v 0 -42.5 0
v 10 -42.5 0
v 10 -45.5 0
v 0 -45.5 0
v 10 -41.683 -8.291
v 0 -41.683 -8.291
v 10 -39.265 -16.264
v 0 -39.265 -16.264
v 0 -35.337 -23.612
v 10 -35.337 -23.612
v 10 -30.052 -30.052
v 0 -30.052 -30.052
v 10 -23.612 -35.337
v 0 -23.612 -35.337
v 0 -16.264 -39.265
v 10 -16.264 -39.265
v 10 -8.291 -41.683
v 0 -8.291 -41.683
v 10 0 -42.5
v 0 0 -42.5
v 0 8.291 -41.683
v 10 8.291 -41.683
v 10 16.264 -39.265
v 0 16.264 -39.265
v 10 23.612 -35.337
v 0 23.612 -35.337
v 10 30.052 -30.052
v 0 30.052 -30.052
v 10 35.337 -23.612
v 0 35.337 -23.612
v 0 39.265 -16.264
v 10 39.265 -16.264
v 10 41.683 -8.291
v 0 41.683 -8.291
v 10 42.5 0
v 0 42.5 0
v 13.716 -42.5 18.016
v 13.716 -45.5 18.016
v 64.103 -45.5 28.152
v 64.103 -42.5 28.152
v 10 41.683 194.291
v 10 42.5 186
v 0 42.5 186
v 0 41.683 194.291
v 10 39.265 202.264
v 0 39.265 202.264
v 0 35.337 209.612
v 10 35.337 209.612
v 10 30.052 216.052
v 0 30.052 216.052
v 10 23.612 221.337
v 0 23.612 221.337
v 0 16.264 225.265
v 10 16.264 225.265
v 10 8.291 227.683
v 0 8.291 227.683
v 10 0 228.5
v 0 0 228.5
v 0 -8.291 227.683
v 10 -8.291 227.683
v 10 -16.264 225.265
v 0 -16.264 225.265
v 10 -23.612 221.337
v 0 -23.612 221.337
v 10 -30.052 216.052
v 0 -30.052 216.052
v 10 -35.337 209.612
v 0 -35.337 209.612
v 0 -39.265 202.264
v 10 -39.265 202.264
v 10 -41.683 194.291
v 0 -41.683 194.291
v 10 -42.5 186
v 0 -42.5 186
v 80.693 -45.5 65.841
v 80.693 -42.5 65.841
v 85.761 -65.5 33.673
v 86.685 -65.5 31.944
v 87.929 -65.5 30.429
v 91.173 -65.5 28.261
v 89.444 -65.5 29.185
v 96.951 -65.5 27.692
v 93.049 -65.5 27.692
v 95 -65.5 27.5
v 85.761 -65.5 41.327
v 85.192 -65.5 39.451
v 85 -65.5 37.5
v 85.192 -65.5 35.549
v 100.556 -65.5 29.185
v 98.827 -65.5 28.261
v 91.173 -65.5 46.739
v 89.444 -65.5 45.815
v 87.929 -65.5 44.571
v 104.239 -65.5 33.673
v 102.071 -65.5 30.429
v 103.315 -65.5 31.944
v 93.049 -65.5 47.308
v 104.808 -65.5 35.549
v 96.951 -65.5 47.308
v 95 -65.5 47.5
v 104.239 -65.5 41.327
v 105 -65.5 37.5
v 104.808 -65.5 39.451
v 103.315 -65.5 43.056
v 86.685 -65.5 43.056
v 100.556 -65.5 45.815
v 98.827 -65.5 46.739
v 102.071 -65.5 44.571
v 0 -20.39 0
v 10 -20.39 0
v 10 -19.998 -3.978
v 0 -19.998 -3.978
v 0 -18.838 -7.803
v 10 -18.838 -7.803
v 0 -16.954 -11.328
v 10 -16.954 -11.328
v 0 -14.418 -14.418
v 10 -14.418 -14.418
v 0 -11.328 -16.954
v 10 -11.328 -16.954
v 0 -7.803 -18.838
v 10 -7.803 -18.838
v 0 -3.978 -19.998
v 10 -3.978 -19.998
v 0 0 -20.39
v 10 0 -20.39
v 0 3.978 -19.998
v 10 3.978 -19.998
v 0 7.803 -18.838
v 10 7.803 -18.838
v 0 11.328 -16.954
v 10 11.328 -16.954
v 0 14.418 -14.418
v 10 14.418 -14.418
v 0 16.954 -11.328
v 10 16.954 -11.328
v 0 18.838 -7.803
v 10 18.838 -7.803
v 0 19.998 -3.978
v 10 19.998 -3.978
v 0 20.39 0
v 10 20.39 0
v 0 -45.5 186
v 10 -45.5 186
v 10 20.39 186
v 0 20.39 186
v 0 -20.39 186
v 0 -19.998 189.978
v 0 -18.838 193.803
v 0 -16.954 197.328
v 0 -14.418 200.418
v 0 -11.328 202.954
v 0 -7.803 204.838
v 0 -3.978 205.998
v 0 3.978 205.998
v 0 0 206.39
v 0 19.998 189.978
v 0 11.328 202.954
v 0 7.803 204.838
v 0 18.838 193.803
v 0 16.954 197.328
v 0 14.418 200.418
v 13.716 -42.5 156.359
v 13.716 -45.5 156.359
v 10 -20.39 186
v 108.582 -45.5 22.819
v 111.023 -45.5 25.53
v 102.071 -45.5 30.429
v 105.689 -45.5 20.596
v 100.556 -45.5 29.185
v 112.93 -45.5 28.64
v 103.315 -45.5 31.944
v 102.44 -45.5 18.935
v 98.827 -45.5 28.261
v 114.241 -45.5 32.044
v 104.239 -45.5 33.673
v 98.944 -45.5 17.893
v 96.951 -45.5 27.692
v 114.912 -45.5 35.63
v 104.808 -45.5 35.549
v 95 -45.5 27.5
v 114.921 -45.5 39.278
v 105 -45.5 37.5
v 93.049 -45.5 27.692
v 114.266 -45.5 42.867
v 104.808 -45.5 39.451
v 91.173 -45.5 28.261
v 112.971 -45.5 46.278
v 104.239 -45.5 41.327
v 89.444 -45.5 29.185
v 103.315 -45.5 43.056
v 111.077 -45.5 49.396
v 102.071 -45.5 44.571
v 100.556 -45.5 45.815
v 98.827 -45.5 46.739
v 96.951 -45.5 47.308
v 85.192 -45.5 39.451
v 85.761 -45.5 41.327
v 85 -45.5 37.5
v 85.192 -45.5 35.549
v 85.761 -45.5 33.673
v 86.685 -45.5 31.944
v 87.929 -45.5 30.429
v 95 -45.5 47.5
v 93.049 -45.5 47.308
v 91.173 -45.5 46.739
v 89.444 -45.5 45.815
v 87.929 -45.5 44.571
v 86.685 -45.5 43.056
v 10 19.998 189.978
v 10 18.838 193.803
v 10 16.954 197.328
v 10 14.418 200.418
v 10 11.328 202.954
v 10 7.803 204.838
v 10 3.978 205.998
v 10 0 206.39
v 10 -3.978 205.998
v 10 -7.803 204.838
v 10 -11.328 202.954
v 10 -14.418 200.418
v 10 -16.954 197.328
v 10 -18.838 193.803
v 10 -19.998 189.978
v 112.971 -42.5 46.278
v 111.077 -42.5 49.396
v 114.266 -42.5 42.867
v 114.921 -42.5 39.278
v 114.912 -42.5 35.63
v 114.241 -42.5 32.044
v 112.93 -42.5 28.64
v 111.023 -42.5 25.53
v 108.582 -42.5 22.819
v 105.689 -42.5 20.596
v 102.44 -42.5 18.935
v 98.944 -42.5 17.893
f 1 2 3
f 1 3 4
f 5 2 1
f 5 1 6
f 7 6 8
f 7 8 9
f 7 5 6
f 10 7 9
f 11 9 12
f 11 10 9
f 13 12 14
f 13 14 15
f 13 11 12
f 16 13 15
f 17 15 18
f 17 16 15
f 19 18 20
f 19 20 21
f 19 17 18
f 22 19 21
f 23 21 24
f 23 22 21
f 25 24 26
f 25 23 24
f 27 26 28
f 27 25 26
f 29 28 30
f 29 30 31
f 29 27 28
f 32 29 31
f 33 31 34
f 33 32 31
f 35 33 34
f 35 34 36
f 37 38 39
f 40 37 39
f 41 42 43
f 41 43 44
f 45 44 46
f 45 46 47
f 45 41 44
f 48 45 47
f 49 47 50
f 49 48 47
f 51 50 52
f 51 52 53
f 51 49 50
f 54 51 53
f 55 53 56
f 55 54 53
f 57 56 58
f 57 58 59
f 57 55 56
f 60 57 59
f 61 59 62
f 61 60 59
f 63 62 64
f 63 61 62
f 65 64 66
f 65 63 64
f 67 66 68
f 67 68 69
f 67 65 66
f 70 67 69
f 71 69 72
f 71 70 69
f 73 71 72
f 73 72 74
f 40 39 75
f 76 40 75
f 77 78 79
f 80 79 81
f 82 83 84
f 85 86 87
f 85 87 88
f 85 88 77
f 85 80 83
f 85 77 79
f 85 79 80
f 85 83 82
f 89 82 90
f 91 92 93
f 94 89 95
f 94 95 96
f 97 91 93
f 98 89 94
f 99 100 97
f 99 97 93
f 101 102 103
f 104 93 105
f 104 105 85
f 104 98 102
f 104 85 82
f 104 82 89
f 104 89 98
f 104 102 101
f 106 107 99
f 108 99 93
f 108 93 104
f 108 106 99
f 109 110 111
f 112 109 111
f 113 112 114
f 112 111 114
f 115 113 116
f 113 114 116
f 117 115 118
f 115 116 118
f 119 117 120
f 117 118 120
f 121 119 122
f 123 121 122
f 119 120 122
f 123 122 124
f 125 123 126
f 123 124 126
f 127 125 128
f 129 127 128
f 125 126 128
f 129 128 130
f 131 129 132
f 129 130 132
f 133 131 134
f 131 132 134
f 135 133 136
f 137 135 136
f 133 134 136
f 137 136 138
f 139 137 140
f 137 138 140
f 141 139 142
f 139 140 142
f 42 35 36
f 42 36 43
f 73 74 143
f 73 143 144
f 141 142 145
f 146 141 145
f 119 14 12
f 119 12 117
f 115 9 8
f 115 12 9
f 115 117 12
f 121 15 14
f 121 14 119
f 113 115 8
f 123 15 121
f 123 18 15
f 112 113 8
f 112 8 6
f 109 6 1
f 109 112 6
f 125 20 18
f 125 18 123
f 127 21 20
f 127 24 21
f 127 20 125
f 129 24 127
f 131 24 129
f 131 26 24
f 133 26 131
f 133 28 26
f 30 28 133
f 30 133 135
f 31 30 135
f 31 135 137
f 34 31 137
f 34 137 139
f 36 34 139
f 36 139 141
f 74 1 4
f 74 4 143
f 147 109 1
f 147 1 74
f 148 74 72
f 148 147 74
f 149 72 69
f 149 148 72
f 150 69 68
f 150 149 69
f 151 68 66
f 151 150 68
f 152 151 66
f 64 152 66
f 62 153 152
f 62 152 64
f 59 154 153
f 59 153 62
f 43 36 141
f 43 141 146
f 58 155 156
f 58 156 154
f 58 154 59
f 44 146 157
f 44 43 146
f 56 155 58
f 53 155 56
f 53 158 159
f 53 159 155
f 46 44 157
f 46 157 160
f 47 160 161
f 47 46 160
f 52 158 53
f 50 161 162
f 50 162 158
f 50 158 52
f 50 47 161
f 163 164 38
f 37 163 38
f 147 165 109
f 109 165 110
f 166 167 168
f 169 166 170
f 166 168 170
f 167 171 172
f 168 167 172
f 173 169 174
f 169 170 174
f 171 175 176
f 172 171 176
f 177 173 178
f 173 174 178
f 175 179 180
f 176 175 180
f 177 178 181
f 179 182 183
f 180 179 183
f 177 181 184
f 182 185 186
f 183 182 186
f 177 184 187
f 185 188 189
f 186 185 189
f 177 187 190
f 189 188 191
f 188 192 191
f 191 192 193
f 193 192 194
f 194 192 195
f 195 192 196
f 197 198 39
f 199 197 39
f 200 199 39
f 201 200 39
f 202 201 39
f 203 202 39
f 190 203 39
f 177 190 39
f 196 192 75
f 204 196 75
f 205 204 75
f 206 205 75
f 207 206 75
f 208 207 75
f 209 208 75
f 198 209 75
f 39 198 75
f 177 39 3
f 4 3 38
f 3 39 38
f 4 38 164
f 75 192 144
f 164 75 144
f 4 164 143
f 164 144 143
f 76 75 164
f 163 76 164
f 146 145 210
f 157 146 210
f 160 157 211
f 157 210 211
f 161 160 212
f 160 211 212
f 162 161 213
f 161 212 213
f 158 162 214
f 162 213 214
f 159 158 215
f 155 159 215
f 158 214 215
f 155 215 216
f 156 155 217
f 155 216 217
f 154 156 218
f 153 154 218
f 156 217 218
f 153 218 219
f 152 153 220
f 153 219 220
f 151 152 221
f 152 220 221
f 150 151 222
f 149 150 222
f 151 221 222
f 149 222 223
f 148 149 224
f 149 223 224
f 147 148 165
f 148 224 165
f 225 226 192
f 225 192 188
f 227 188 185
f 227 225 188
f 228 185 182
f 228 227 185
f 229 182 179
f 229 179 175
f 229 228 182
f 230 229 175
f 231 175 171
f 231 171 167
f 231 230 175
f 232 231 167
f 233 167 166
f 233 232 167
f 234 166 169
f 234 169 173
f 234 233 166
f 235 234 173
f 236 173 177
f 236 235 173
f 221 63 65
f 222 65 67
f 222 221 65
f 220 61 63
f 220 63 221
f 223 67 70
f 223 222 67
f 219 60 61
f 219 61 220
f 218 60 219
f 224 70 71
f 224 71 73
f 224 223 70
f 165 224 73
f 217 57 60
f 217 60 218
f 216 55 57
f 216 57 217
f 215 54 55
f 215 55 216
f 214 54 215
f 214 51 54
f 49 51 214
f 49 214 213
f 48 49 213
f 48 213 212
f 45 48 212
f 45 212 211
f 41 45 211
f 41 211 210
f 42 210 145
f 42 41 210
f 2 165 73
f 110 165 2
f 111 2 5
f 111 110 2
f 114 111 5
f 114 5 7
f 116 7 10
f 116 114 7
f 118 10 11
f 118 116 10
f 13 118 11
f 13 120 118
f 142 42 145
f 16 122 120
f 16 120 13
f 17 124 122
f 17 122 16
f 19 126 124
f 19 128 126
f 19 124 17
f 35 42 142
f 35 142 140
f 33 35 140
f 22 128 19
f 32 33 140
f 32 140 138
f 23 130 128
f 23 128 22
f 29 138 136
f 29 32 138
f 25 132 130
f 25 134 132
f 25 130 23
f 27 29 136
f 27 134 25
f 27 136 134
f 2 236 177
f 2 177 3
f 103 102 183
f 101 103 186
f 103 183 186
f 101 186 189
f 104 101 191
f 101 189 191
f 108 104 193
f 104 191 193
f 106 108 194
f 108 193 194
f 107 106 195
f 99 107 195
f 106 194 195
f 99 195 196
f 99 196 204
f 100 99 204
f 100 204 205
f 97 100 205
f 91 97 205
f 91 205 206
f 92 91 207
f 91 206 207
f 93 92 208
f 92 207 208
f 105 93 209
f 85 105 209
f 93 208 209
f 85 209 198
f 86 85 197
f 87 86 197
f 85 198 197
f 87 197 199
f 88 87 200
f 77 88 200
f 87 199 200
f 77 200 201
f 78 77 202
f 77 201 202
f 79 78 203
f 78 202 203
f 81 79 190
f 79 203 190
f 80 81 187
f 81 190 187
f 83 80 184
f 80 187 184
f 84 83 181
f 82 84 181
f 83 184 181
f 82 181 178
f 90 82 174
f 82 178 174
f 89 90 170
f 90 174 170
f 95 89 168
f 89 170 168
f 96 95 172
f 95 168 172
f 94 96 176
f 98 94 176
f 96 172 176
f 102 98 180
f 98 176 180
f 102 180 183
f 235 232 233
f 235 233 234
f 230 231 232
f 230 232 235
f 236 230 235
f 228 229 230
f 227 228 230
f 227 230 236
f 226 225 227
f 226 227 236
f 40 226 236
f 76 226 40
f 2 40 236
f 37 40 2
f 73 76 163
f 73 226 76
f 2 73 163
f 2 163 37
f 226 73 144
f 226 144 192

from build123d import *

# Parameters (mm, degrees)
BOSS_EXTRUDE1_DEPTH = 10
BOSS_EXTRUDE2_DEPTH = 3
SKETCH3_R           = 10
BOSS_EXTRUDE3_DEPTH = 20
CUT_EXTRUDE1_DEPTH  = 11
CUT_EXTRUDE2_DEPTH  = 89


with BuildPart() as part:
    # Sketch1 → Boss-Extrude1 (new body)
    with BuildSketch(Plane(origin=(10, 0, 0), x_dir=(0, 0, -1), z_dir=(1, 0, 0))):
        with BuildLine():
            Line((0, 42.5), (-186, 42.5))
            ThreePointArc((-186, 42.5), (-228.5, 0), (-186, -42.5))
            Line((-186, -42.5), (0, -42.5))
            ThreePointArc((0, -42.5), (42.5, 0), (0, 42.5))
        make_face()
    extrude(amount=-BOSS_EXTRUDE1_DEPTH)

    # Sketch2 → Boss-Extrude2 (add)
    with BuildSketch(Plane.XZ.offset(42.5)):
        with BuildLine():
            Line((98.944350751, 17.892804965), (10, 0))
            Line((10, 0), (0, 0))
            Line((0, 0), (0, 186))
            Line((0, 186), (10, 186))
            Line((10, 186), (111.07737178, 49.396138729))
            ThreePointArc((111.07737178, 49.396138729), (113.663663971, 30.311978912), (98.944350751, 17.892804965))
        make_face()
    extrude(amount=BOSS_EXTRUDE2_DEPTH)

    # Sketch3 → Boss-Extrude3 (add)
    with BuildSketch(Plane.XZ.offset(45.5)):
        with Locations((95, 37.5)):
            Circle(SKETCH3_R)
    extrude(amount=BOSS_EXTRUDE3_DEPTH)

    # Sketch4 → Cut-Extrude1 (cut, through all)
    with BuildSketch(Plane(origin=(10, 0, 0), x_dir=(0, 0, -1), z_dir=(1, 0, 0))):
        with BuildLine():
            Line((-186, -20.390002673), (0, -20.390002673))
            ThreePointArc((0, -20.390002673), (20.390002673, 0), (0, 20.390002673))
            Line((0, 20.390002673), (-186, 20.390002673))
            ThreePointArc((-186, 20.390002673), (-206.390002673, 0), (-186, -20.390002673))
        make_face()
    extrude(amount=-CUT_EXTRUDE1_DEPTH, mode=Mode.SUBTRACT)

    # Sketch5 → Cut-Extrude2 (cut, through all)
    with BuildSketch(Plane.XZ.offset(45.5)):
        Polygon((13.715935026, 156.359237723), (13.715935026, 18.016014269), (64.102931729, 28.152292708), (80.693023557, 65.841164794), align=None)
    extrude(amount=-CUT_EXTRUDE2_DEPTH, mode=Mode.SUBTRACT)


solid = part.part
